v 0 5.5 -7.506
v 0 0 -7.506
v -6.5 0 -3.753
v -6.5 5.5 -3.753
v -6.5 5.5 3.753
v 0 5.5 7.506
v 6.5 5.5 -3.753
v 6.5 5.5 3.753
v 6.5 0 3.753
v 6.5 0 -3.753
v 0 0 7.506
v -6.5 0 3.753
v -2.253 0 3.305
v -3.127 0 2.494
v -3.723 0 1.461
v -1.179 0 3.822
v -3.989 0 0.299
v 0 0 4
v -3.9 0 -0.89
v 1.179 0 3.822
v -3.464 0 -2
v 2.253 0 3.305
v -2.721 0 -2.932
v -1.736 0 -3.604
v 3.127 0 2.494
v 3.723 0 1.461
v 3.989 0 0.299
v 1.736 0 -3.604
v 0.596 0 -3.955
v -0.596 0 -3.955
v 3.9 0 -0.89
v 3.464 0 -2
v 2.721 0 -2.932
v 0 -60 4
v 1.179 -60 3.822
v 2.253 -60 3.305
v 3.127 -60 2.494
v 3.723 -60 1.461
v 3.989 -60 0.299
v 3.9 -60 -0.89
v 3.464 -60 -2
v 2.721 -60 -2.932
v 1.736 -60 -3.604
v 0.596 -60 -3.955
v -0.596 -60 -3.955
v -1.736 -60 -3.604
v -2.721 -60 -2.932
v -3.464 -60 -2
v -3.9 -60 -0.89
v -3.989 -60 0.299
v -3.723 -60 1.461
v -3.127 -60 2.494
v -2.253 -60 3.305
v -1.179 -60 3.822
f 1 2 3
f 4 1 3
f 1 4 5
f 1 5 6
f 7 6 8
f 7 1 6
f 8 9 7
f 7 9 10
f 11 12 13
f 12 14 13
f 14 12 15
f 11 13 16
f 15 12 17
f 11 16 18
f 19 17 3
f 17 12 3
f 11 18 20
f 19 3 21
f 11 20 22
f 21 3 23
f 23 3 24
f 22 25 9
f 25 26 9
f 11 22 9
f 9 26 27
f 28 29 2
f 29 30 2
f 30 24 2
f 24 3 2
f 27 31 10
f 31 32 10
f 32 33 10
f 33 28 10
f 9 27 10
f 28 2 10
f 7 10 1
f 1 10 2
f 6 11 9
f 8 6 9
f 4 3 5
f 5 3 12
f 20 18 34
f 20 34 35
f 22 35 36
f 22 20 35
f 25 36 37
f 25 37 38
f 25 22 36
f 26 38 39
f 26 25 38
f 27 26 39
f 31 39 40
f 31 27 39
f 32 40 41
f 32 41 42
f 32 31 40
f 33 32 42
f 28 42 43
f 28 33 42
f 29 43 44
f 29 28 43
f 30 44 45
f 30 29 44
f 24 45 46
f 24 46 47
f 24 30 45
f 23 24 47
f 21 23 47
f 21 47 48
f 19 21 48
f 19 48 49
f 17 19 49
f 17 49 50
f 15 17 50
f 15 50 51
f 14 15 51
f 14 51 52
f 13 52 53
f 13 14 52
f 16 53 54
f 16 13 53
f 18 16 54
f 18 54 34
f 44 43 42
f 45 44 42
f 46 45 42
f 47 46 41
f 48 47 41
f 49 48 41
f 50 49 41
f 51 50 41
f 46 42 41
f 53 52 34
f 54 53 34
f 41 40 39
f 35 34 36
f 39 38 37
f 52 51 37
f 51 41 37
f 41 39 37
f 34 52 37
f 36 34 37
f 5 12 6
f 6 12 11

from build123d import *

# Parameters (mm, degrees)
BOSS_EXTRU_1_DEPTH = 5.5
ESQUISSE2_R        = 4
BOSS_EXTRU_2_DEPTH = 60


with BuildPart() as part:
    # Esquisse1 → Boss.-Extru.1 (new body)
    with BuildSketch(Plane(origin=(0, 0, 0), x_dir=(1, 0, 0), z_dir=(0, 1, 0))):
        Polygon((6.5, 3.75277675), (0, 7.505553499), (-6.5, 3.75277675), (-6.5, -3.75277675), (0, -7.505553499), (6.5, -3.75277675), align=None)
    extrude(amount=BOSS_EXTRU_1_DEPTH)

    # Esquisse2 → Boss.-Extru.2 (add)
    with BuildSketch(Plane(origin=(0, 0, 0), x_dir=(1, 0, 0), z_dir=(0, 1, 0))):
        with Locations(Location((0, 0, 0), (0, 0, 270))):
            Circle(ESQUISSE2_R)
    extrude(amount=-BOSS_EXTRU_2_DEPTH)


solid = part.part
